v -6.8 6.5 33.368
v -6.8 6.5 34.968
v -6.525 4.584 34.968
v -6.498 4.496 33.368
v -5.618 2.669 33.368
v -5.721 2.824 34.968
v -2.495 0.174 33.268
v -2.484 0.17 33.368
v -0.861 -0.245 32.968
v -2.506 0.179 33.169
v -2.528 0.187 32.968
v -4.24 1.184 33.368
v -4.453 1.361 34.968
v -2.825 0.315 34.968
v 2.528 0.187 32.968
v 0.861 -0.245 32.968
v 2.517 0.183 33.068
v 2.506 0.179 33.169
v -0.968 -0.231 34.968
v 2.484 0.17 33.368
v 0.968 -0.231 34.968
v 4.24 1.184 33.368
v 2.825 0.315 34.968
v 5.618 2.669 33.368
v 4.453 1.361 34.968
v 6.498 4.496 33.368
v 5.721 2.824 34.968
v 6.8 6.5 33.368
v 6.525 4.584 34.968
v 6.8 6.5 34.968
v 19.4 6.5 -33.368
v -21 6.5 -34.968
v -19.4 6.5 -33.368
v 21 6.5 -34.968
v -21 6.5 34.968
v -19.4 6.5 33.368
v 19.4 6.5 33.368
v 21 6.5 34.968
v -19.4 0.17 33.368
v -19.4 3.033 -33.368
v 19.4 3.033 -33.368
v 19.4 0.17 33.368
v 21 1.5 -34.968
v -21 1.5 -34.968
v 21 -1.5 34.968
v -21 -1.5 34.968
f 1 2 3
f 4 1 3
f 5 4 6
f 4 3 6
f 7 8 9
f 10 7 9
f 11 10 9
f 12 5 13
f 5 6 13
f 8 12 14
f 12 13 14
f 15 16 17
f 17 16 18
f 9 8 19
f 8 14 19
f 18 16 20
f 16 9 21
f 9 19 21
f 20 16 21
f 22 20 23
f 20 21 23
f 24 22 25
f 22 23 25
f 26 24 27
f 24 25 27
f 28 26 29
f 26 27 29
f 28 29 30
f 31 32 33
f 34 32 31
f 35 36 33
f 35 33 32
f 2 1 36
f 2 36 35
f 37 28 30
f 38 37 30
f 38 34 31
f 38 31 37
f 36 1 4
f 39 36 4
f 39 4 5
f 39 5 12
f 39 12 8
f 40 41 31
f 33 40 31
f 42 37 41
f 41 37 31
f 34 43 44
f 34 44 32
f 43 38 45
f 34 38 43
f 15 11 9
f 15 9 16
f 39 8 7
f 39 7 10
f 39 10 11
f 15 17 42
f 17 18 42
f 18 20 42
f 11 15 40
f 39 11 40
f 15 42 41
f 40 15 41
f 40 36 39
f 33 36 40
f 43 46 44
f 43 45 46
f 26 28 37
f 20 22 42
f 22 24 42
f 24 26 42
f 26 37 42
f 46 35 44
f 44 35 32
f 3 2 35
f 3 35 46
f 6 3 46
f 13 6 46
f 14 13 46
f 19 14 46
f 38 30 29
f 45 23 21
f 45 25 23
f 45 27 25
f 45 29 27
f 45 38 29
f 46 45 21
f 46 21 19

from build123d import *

# Parameters (mm, degrees)
BOSS_EXTRUDE1_DEPTH = 21
SHELL1_T            = -1.6
SKETCH2_R           = 6.8
CUT_EXTRUDE1_DEPTH  = 2


with BuildPart() as part:
    # Sketch1 → Boss-Extrude1 (new, symmetric)
    with BuildSketch(Plane(origin=(0, 0, 0), x_dir=(0, 0, -1), z_dir=(1, 0, 0))):
        Polygon((-34.96784237, -1.5), (34.96784237, 1.5), (34.96784237, 6.5), (-34.96784237, 6.5), align=None)
    extrude(amount=BOSS_EXTRUDE1_DEPTH, both=True)

    # Shell1
    shell1_openings = [part.faces().sort_by_distance(p)[0] for p in [
        (0, 6.5, 0),
    ]]
    offset(amount=SHELL1_T, openings=shell1_openings, kind=Kind.INTERSECTION)

    # Sketch2 → Cut-Extrude1 (cut)
    with BuildSketch(Plane.XY.offset(34.96784237)):
        with Locations((0, 6.5)):
            Circle(SKETCH2_R)
    extrude(amount=-CUT_EXTRUDE1_DEPTH, mode=Mode.SUBTRACT)


solid = part.part
